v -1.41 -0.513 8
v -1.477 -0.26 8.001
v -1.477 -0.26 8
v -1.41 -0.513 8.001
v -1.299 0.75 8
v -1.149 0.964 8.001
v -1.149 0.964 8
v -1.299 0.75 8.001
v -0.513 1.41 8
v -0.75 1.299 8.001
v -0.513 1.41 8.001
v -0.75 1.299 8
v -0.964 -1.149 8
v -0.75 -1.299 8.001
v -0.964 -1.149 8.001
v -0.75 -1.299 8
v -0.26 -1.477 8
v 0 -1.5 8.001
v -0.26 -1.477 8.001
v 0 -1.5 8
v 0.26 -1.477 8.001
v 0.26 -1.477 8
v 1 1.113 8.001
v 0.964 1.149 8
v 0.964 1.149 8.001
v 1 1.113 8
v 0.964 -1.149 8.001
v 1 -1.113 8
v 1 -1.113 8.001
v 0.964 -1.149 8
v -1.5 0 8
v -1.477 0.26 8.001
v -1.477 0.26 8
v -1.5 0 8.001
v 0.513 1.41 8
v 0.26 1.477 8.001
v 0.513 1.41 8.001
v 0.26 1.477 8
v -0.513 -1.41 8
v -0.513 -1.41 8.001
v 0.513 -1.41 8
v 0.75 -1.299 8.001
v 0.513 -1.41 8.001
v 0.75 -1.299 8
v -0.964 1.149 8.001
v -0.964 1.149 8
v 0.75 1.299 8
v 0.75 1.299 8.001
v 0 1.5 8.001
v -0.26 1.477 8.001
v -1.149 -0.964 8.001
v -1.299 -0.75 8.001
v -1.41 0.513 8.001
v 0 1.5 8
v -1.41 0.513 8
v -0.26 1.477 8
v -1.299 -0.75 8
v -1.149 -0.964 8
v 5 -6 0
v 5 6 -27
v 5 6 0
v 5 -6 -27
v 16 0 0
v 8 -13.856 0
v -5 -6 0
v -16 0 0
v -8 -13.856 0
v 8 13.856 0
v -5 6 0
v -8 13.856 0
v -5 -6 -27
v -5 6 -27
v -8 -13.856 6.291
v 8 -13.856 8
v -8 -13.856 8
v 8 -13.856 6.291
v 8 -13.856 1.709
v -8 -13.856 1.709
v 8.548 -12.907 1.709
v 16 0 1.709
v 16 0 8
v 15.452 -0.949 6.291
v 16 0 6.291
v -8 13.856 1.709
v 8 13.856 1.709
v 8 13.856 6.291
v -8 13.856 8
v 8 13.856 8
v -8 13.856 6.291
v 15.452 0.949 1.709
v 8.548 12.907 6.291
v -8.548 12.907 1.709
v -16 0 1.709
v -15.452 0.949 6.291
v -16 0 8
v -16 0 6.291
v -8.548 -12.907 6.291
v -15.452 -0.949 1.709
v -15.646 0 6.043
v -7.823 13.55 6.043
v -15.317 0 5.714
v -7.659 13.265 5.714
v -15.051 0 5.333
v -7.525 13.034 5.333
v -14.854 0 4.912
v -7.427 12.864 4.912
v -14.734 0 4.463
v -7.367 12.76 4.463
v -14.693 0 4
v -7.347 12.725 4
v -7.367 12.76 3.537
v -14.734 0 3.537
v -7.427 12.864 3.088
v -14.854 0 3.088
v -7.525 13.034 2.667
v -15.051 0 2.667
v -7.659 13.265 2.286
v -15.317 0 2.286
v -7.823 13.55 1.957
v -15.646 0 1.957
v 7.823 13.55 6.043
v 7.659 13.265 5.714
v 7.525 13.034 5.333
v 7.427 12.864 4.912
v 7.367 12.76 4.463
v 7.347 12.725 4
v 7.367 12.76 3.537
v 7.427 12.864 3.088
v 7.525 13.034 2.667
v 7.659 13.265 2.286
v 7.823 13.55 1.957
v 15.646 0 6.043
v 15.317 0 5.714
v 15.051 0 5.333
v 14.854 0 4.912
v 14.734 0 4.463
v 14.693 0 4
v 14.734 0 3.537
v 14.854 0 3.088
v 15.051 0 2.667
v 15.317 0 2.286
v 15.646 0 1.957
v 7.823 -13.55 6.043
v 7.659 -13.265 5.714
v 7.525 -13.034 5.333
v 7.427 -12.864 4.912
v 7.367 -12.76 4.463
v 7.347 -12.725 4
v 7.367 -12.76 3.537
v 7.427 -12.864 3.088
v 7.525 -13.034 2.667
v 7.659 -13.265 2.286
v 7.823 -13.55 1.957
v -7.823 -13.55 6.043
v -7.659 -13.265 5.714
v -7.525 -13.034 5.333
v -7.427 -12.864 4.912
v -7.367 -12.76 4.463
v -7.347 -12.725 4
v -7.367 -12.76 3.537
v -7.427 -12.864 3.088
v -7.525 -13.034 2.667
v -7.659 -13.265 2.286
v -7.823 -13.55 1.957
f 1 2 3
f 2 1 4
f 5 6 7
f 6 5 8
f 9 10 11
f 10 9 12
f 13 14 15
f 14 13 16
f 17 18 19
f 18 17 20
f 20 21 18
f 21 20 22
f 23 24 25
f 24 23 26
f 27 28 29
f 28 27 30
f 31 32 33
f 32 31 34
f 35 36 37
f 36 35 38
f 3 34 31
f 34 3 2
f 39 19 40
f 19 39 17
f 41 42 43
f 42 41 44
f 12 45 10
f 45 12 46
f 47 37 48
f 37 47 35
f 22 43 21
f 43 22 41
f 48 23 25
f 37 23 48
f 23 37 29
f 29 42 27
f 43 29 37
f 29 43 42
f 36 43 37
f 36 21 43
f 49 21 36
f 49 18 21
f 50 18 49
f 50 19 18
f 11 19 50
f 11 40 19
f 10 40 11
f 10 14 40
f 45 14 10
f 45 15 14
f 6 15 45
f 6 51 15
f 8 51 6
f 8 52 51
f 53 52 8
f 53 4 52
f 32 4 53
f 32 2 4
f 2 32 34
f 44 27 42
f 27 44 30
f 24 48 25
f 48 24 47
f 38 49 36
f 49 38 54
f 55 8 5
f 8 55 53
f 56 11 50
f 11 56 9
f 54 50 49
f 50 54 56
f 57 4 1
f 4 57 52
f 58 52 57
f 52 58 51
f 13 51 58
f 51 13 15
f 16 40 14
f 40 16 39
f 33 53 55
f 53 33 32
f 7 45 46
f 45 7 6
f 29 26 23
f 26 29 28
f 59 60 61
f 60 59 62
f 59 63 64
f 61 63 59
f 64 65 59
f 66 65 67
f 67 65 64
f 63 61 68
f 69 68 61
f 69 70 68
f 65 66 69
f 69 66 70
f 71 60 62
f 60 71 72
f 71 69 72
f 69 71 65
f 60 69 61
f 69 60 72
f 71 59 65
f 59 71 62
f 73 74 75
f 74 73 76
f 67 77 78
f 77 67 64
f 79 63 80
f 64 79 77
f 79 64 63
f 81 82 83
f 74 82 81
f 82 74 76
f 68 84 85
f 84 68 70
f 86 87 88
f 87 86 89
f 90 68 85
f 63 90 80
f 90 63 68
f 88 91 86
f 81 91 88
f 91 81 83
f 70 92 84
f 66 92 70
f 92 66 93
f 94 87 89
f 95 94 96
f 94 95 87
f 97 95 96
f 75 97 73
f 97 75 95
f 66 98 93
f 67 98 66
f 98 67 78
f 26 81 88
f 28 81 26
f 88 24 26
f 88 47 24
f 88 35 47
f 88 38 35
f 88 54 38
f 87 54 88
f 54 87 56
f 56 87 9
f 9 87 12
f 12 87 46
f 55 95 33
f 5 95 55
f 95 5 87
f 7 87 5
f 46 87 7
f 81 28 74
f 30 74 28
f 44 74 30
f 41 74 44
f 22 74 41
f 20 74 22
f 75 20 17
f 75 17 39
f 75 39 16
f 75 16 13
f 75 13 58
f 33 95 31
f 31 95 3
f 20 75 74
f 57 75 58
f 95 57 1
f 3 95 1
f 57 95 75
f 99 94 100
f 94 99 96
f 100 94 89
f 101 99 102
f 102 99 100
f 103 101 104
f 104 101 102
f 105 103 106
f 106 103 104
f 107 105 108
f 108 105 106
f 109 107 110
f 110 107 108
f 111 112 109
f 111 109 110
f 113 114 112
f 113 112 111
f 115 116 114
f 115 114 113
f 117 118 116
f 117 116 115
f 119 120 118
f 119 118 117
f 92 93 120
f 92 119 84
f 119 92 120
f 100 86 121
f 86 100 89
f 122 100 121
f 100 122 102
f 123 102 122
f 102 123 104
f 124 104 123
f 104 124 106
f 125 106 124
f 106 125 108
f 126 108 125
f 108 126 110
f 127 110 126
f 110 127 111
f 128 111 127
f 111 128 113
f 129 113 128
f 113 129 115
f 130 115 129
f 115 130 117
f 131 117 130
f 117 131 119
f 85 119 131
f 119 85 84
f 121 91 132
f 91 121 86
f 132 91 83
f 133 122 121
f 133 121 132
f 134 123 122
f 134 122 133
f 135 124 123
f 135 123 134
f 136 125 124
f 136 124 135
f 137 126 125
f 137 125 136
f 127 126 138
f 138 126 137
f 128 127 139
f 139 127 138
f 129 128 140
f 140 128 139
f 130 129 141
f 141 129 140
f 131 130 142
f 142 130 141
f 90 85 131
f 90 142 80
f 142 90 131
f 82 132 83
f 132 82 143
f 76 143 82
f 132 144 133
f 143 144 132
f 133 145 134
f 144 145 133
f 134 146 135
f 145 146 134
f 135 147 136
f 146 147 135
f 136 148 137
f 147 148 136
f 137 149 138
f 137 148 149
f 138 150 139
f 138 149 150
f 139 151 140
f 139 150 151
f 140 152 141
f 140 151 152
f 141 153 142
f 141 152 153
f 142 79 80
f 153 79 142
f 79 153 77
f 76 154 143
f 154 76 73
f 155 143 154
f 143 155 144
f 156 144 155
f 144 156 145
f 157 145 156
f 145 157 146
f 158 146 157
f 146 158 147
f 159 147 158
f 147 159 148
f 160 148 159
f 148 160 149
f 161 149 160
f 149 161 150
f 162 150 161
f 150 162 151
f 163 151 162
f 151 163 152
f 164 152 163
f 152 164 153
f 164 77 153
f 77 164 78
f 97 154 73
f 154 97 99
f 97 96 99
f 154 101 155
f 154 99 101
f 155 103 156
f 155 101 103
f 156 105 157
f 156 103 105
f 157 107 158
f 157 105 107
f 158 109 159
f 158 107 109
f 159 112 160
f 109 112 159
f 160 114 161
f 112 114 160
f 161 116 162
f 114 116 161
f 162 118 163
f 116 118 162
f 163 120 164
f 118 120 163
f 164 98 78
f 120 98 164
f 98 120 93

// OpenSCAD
/* [Rendering] */
// Higher makes smoother circles. Use roughly 2x diameter for smooth prints.
$fn = 36; // *4 for final

overlap_cut = 0.001;

// DC N20 motor dimensions
//https://botland.store/n20-micro-motors-mp-series-medium-power/12606-micro-motor-n20-bt44-250-1-90rpm-6v-5904422306731.html
n20_shaft_length = 8;
n20_height = 10;
n20_width = 12;
n20_depth = 27;

// Wheel size
hub_outer_radius = 16; 


module n20_motor() {
    union() {
        color("silver")
        translate([-n20_height/2,-n20_width/2,-n20_depth])
        cube([n20_height, n20_width, n20_depth]);
        
        // SHAFT SETTINGS
        // ------------------------------------------
        // Measured diameter of your motor shaft (usually 3mm)
        shaft_diameter = 3.0; 

        // The "D" thickness (Distance from flat surface to opposite curved wall)
        // For a 3mm shaft, this is usually 2.5mm. Measure yours with calipers!
        shaft_flat_thickness = 2.5; 
        

        color("silver")
        translate([0,0,-overlap_cut])
        intersection() {
            translate([0,0,n20_shaft_length/2 + overlap_cut])
            cylinder(h=n20_shaft_length + 2*overlap_cut, d=shaft_diameter, center=true);
            translate([-shaft_diameter/2, -shaft_diameter/2, 0])
            cube([shaft_flat_thickness,shaft_diameter,n20_shaft_length + 2*overlap_cut]);
        }
    }
 }

// TODO: Subtract
n20_motor();

// Hard plastic
difference() {
    color("FireBrick")
    cylinder(h=n20_shaft_length, r=hub_outer_radius, $fn = 6);

    // Groove
    translate([0,0,n20_shaft_length/2])
    rotate_extrude(convexity = 10, $fn=6)
    translate([hub_outer_radius + n20_shaft_length * .17, 0, 0])
    circle(d = n20_shaft_length * (2/3), $fn=36);
    
    n20_motor();
}
